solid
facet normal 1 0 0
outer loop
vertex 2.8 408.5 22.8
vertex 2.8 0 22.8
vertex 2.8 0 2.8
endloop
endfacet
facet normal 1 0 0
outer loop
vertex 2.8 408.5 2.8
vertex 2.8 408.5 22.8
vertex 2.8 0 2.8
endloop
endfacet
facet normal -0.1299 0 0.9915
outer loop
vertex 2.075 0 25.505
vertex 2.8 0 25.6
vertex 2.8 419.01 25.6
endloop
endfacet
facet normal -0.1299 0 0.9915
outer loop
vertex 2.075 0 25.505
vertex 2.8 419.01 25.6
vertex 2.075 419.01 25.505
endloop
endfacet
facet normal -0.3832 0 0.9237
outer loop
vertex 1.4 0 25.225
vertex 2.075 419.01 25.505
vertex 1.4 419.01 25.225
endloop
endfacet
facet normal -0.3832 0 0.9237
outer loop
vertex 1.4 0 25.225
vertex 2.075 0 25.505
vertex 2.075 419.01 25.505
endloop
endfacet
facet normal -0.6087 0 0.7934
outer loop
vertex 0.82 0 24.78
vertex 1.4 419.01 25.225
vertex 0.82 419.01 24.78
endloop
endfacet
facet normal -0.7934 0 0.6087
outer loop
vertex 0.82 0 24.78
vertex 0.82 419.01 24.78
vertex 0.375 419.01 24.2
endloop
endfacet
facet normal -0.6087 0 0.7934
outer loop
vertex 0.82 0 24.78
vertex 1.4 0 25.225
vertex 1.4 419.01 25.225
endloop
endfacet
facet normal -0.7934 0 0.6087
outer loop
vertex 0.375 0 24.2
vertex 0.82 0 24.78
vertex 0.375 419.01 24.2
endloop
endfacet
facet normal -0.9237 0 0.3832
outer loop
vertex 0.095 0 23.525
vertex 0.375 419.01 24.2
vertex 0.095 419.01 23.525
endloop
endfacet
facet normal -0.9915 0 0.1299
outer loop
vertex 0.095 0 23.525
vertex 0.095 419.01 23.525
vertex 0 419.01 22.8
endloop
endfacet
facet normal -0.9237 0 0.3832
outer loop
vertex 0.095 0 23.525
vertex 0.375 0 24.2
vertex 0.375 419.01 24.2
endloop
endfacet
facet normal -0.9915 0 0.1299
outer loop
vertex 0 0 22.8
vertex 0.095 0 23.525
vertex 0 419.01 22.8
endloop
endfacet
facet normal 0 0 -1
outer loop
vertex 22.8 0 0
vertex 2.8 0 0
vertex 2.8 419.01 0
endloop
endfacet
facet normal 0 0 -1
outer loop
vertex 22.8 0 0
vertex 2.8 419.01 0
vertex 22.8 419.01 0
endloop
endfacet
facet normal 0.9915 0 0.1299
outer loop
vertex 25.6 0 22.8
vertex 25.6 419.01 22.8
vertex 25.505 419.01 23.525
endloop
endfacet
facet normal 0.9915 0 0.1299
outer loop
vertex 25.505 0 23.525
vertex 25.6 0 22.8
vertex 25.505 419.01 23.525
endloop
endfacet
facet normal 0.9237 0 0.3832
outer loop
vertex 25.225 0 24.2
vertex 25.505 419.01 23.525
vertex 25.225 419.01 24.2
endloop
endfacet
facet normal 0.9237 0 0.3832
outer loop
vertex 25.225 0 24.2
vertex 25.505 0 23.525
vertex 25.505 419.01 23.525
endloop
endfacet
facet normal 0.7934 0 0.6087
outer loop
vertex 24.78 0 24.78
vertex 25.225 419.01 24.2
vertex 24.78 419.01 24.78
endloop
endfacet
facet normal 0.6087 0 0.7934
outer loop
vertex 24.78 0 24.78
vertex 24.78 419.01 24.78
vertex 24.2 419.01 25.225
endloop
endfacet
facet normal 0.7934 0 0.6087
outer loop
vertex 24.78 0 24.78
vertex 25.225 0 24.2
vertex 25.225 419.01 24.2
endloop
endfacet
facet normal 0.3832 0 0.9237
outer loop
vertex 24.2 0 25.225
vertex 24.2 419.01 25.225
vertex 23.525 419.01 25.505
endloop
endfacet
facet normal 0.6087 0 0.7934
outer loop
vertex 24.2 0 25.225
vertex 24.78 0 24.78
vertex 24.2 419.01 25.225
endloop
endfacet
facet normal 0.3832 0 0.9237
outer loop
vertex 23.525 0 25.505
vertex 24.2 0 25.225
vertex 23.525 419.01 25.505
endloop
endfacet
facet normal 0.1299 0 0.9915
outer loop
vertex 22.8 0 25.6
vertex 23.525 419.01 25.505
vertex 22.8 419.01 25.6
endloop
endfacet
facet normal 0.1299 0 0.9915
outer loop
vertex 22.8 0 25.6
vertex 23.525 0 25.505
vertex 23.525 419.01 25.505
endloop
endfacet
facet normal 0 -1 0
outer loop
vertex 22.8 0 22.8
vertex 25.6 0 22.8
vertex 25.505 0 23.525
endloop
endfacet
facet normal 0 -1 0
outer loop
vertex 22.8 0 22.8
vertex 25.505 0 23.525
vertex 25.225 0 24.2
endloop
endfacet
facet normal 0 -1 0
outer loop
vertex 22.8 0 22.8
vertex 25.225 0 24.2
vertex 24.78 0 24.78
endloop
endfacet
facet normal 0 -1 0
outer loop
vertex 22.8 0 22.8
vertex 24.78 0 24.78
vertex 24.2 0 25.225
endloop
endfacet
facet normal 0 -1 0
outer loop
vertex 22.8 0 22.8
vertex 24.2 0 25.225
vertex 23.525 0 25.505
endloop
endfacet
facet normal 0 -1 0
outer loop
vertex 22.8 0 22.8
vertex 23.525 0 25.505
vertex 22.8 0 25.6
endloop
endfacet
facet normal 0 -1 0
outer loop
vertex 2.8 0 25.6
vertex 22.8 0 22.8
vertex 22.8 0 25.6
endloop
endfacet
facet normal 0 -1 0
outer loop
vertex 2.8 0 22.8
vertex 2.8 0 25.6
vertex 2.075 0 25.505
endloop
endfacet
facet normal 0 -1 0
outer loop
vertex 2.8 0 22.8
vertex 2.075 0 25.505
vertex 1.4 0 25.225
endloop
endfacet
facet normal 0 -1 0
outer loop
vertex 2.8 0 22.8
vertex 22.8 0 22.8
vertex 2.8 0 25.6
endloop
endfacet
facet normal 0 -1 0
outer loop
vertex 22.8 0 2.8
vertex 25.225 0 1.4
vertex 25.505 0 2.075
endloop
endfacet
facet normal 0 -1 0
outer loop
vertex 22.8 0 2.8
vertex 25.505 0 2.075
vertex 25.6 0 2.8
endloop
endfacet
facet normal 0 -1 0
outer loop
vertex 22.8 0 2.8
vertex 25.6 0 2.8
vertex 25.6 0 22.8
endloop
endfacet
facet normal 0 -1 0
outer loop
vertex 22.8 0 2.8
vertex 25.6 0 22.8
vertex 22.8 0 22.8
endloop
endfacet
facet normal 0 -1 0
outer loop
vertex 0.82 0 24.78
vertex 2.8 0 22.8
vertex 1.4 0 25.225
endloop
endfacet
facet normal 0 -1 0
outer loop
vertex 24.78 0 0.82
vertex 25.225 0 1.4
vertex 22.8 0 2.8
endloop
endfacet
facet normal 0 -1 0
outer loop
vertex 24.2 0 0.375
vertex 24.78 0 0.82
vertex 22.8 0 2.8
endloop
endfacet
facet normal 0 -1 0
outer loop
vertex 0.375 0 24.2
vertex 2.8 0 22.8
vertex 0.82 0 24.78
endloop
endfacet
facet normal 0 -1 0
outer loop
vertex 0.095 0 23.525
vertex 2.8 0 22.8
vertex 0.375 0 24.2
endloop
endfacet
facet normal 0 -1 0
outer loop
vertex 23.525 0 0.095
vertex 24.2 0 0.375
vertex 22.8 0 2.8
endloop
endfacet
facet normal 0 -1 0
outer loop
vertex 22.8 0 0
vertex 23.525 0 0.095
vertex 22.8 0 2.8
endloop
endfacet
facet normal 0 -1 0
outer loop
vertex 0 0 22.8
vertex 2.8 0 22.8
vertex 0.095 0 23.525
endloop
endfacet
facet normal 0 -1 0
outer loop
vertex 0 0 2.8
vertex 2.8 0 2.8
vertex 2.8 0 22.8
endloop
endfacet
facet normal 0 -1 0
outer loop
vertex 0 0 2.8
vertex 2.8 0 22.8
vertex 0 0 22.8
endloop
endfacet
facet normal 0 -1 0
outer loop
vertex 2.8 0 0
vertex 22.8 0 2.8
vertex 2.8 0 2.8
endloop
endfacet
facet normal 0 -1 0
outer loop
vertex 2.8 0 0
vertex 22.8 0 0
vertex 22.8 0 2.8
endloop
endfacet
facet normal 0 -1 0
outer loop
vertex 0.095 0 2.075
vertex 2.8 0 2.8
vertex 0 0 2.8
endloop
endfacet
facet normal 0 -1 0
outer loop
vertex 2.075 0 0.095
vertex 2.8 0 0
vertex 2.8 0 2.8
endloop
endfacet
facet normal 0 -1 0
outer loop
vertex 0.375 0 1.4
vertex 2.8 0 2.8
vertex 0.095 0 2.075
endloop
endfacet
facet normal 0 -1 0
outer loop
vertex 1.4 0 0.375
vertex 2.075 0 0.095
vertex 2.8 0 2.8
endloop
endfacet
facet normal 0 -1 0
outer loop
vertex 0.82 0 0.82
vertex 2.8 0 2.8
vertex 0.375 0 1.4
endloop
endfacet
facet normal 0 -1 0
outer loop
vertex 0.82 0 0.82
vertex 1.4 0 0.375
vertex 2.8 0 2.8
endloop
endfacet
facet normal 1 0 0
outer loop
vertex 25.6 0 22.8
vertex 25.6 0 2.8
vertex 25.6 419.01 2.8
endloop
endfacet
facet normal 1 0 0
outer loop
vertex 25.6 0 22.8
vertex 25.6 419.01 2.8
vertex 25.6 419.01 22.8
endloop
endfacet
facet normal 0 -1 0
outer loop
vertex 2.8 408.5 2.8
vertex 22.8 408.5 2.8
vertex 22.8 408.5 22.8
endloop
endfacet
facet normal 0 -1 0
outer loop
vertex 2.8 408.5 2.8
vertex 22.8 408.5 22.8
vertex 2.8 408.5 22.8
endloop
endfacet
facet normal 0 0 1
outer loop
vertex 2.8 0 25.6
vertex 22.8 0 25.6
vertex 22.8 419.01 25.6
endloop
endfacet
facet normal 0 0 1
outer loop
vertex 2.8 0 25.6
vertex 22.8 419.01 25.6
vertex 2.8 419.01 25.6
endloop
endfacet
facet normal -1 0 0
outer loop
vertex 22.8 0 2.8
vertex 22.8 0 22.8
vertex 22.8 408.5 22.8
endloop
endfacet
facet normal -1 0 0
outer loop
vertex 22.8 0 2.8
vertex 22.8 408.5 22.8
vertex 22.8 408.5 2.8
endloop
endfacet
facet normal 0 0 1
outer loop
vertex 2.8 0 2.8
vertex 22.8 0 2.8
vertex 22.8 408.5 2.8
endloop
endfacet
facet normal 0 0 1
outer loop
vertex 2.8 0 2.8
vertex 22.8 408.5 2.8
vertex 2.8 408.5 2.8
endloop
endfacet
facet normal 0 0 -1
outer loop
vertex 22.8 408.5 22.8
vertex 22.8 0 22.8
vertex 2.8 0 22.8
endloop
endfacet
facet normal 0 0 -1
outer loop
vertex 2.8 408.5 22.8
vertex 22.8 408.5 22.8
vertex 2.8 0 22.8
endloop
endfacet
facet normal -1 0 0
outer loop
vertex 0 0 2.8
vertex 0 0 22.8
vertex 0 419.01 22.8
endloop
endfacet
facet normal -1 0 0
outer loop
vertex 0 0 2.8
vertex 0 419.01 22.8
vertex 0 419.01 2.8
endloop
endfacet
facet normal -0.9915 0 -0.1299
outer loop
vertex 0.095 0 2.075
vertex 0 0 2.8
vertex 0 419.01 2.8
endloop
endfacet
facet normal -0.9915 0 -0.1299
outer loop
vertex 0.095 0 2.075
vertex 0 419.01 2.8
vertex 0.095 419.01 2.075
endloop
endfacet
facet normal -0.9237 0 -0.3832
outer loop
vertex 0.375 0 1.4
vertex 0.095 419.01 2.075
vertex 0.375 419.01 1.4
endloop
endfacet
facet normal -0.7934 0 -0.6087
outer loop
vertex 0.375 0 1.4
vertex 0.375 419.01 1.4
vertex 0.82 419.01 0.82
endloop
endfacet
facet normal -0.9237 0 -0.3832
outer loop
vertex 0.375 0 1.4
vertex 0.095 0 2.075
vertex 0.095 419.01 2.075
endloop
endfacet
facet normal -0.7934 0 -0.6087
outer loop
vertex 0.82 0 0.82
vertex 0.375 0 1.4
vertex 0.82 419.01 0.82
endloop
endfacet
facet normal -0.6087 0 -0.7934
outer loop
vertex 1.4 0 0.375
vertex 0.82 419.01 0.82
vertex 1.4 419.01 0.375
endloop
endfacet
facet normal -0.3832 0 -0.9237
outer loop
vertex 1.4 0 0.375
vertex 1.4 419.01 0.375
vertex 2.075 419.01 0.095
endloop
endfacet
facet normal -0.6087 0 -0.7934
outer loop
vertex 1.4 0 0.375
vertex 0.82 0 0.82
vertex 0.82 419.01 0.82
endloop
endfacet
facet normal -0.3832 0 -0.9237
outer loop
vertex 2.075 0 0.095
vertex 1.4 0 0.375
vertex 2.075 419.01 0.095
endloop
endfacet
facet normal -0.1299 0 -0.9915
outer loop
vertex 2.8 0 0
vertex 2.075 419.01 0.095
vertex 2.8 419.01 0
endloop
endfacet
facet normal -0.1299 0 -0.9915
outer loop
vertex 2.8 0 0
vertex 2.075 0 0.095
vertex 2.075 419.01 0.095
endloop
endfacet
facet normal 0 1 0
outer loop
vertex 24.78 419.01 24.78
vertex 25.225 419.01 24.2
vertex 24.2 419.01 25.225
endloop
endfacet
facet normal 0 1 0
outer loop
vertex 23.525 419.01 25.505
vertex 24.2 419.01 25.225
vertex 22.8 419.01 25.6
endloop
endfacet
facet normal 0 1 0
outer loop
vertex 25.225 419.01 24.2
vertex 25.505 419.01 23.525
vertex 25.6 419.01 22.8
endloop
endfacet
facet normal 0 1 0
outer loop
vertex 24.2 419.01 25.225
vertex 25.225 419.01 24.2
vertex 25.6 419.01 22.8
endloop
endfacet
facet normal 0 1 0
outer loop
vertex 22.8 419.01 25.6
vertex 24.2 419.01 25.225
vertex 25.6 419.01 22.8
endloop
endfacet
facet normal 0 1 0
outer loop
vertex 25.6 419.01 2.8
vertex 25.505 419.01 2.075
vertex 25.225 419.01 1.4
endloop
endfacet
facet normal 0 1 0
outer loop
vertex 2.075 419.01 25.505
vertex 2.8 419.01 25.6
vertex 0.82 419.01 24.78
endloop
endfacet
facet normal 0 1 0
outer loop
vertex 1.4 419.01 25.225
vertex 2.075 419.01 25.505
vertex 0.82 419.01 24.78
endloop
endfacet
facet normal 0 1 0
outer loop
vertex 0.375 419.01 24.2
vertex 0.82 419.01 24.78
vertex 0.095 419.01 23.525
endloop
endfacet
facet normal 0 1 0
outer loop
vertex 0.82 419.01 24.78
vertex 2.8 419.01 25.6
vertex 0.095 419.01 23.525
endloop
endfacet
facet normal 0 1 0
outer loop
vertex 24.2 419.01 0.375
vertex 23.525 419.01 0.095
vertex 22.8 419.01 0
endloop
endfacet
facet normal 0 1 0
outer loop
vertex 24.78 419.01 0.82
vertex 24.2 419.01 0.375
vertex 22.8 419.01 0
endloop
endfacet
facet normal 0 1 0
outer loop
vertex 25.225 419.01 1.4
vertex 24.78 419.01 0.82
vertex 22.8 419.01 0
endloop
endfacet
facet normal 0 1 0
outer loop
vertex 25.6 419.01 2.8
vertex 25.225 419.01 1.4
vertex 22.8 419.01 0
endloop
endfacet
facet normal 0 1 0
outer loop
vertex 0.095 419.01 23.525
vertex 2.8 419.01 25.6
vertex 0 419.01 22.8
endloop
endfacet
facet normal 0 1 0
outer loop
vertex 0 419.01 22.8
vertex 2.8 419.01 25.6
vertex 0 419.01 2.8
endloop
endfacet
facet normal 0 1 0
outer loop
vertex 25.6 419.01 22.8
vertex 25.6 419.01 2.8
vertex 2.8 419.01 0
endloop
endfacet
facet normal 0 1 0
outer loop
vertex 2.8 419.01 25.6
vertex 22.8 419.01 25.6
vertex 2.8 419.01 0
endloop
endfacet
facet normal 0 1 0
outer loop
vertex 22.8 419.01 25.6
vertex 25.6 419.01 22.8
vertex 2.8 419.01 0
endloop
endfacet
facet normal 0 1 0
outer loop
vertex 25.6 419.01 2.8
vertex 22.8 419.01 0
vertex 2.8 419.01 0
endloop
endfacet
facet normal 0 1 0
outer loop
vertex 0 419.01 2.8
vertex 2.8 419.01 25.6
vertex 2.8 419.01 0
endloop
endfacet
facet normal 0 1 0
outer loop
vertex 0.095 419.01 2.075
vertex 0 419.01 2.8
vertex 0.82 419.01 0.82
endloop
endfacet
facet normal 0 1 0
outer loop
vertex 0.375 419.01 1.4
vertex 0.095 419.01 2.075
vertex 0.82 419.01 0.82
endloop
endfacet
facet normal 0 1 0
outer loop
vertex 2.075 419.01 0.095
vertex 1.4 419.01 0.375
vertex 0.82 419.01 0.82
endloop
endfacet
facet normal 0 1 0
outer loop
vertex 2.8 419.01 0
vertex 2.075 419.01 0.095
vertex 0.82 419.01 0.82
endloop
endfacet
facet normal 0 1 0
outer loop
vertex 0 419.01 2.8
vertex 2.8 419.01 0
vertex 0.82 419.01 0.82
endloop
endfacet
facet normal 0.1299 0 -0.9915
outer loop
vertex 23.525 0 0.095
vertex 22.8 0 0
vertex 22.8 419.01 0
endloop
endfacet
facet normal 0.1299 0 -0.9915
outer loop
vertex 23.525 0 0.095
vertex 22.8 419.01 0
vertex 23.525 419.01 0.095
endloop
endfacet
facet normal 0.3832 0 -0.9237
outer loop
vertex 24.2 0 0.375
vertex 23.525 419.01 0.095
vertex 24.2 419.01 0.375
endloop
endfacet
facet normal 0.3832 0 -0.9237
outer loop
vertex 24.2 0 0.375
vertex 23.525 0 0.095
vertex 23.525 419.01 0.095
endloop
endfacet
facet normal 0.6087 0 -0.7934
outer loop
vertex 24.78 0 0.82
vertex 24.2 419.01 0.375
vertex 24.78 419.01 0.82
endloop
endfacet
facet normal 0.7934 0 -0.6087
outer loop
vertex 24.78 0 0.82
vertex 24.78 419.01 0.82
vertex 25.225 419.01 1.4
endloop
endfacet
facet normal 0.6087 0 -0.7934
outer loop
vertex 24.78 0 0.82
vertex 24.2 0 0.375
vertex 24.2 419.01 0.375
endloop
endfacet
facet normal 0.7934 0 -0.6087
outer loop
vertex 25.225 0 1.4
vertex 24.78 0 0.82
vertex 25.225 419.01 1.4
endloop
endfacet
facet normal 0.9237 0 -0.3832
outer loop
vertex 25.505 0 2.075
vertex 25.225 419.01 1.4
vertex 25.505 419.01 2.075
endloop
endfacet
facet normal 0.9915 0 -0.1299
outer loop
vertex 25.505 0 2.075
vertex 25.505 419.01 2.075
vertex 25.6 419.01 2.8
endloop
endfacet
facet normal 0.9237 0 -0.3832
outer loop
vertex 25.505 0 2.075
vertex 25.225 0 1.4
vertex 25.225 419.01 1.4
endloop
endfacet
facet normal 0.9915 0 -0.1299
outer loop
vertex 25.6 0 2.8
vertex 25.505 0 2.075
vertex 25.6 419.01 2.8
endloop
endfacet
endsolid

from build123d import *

# Parameters (mm, degrees)
BOSS_EXTRUDE1_DEPTH = 419.01
SKETCH3_W           = 20
SKETCH3_H           = 20
CUT_EXTRUDE1_DEPTH  = 408.5


with BuildPart() as part:
    # Sketch1 → Boss-Extrude1 (new body)
    with BuildSketch(Plane(origin=(0, 0, 0), x_dir=(1, 0, 0), z_dir=(0, 1, 0))):
        with BuildLine():
            Line((2.8, 0), (22.8, 0))
            ThreePointArc((22.8, 0), (24.779898987, -0.820101013), (25.6, -2.8))
            Line((25.6, -2.8), (25.6, -22.8))
            ThreePointArc((25.6, -22.8), (24.779898987, -24.779898987), (22.8, -25.6))
            Line((22.8, -25.6), (2.8, -25.6))
            ThreePointArc((2.8, -25.6), (0.820101013, -24.779898987), (0, -22.8))
            Line((0, -22.8), (0, -2.8))
            ThreePointArc((0, -2.8), (0.820101013, -0.820101013), (2.8, 0))
        make_face()
    extrude(amount=BOSS_EXTRUDE1_DEPTH)

    # Sketch3 → Cut-Extrude1 (cut)
    with BuildSketch(Plane(origin=(0, 0, 0), x_dir=(-1, 0, 0), z_dir=(0, -1, 0))):
        with Locations((-12.8, -12.8)):
            Rectangle(SKETCH3_W, SKETCH3_H)
    extrude(amount=-CUT_EXTRUDE1_DEPTH, mode=Mode.SUBTRACT)


solid = part.part
